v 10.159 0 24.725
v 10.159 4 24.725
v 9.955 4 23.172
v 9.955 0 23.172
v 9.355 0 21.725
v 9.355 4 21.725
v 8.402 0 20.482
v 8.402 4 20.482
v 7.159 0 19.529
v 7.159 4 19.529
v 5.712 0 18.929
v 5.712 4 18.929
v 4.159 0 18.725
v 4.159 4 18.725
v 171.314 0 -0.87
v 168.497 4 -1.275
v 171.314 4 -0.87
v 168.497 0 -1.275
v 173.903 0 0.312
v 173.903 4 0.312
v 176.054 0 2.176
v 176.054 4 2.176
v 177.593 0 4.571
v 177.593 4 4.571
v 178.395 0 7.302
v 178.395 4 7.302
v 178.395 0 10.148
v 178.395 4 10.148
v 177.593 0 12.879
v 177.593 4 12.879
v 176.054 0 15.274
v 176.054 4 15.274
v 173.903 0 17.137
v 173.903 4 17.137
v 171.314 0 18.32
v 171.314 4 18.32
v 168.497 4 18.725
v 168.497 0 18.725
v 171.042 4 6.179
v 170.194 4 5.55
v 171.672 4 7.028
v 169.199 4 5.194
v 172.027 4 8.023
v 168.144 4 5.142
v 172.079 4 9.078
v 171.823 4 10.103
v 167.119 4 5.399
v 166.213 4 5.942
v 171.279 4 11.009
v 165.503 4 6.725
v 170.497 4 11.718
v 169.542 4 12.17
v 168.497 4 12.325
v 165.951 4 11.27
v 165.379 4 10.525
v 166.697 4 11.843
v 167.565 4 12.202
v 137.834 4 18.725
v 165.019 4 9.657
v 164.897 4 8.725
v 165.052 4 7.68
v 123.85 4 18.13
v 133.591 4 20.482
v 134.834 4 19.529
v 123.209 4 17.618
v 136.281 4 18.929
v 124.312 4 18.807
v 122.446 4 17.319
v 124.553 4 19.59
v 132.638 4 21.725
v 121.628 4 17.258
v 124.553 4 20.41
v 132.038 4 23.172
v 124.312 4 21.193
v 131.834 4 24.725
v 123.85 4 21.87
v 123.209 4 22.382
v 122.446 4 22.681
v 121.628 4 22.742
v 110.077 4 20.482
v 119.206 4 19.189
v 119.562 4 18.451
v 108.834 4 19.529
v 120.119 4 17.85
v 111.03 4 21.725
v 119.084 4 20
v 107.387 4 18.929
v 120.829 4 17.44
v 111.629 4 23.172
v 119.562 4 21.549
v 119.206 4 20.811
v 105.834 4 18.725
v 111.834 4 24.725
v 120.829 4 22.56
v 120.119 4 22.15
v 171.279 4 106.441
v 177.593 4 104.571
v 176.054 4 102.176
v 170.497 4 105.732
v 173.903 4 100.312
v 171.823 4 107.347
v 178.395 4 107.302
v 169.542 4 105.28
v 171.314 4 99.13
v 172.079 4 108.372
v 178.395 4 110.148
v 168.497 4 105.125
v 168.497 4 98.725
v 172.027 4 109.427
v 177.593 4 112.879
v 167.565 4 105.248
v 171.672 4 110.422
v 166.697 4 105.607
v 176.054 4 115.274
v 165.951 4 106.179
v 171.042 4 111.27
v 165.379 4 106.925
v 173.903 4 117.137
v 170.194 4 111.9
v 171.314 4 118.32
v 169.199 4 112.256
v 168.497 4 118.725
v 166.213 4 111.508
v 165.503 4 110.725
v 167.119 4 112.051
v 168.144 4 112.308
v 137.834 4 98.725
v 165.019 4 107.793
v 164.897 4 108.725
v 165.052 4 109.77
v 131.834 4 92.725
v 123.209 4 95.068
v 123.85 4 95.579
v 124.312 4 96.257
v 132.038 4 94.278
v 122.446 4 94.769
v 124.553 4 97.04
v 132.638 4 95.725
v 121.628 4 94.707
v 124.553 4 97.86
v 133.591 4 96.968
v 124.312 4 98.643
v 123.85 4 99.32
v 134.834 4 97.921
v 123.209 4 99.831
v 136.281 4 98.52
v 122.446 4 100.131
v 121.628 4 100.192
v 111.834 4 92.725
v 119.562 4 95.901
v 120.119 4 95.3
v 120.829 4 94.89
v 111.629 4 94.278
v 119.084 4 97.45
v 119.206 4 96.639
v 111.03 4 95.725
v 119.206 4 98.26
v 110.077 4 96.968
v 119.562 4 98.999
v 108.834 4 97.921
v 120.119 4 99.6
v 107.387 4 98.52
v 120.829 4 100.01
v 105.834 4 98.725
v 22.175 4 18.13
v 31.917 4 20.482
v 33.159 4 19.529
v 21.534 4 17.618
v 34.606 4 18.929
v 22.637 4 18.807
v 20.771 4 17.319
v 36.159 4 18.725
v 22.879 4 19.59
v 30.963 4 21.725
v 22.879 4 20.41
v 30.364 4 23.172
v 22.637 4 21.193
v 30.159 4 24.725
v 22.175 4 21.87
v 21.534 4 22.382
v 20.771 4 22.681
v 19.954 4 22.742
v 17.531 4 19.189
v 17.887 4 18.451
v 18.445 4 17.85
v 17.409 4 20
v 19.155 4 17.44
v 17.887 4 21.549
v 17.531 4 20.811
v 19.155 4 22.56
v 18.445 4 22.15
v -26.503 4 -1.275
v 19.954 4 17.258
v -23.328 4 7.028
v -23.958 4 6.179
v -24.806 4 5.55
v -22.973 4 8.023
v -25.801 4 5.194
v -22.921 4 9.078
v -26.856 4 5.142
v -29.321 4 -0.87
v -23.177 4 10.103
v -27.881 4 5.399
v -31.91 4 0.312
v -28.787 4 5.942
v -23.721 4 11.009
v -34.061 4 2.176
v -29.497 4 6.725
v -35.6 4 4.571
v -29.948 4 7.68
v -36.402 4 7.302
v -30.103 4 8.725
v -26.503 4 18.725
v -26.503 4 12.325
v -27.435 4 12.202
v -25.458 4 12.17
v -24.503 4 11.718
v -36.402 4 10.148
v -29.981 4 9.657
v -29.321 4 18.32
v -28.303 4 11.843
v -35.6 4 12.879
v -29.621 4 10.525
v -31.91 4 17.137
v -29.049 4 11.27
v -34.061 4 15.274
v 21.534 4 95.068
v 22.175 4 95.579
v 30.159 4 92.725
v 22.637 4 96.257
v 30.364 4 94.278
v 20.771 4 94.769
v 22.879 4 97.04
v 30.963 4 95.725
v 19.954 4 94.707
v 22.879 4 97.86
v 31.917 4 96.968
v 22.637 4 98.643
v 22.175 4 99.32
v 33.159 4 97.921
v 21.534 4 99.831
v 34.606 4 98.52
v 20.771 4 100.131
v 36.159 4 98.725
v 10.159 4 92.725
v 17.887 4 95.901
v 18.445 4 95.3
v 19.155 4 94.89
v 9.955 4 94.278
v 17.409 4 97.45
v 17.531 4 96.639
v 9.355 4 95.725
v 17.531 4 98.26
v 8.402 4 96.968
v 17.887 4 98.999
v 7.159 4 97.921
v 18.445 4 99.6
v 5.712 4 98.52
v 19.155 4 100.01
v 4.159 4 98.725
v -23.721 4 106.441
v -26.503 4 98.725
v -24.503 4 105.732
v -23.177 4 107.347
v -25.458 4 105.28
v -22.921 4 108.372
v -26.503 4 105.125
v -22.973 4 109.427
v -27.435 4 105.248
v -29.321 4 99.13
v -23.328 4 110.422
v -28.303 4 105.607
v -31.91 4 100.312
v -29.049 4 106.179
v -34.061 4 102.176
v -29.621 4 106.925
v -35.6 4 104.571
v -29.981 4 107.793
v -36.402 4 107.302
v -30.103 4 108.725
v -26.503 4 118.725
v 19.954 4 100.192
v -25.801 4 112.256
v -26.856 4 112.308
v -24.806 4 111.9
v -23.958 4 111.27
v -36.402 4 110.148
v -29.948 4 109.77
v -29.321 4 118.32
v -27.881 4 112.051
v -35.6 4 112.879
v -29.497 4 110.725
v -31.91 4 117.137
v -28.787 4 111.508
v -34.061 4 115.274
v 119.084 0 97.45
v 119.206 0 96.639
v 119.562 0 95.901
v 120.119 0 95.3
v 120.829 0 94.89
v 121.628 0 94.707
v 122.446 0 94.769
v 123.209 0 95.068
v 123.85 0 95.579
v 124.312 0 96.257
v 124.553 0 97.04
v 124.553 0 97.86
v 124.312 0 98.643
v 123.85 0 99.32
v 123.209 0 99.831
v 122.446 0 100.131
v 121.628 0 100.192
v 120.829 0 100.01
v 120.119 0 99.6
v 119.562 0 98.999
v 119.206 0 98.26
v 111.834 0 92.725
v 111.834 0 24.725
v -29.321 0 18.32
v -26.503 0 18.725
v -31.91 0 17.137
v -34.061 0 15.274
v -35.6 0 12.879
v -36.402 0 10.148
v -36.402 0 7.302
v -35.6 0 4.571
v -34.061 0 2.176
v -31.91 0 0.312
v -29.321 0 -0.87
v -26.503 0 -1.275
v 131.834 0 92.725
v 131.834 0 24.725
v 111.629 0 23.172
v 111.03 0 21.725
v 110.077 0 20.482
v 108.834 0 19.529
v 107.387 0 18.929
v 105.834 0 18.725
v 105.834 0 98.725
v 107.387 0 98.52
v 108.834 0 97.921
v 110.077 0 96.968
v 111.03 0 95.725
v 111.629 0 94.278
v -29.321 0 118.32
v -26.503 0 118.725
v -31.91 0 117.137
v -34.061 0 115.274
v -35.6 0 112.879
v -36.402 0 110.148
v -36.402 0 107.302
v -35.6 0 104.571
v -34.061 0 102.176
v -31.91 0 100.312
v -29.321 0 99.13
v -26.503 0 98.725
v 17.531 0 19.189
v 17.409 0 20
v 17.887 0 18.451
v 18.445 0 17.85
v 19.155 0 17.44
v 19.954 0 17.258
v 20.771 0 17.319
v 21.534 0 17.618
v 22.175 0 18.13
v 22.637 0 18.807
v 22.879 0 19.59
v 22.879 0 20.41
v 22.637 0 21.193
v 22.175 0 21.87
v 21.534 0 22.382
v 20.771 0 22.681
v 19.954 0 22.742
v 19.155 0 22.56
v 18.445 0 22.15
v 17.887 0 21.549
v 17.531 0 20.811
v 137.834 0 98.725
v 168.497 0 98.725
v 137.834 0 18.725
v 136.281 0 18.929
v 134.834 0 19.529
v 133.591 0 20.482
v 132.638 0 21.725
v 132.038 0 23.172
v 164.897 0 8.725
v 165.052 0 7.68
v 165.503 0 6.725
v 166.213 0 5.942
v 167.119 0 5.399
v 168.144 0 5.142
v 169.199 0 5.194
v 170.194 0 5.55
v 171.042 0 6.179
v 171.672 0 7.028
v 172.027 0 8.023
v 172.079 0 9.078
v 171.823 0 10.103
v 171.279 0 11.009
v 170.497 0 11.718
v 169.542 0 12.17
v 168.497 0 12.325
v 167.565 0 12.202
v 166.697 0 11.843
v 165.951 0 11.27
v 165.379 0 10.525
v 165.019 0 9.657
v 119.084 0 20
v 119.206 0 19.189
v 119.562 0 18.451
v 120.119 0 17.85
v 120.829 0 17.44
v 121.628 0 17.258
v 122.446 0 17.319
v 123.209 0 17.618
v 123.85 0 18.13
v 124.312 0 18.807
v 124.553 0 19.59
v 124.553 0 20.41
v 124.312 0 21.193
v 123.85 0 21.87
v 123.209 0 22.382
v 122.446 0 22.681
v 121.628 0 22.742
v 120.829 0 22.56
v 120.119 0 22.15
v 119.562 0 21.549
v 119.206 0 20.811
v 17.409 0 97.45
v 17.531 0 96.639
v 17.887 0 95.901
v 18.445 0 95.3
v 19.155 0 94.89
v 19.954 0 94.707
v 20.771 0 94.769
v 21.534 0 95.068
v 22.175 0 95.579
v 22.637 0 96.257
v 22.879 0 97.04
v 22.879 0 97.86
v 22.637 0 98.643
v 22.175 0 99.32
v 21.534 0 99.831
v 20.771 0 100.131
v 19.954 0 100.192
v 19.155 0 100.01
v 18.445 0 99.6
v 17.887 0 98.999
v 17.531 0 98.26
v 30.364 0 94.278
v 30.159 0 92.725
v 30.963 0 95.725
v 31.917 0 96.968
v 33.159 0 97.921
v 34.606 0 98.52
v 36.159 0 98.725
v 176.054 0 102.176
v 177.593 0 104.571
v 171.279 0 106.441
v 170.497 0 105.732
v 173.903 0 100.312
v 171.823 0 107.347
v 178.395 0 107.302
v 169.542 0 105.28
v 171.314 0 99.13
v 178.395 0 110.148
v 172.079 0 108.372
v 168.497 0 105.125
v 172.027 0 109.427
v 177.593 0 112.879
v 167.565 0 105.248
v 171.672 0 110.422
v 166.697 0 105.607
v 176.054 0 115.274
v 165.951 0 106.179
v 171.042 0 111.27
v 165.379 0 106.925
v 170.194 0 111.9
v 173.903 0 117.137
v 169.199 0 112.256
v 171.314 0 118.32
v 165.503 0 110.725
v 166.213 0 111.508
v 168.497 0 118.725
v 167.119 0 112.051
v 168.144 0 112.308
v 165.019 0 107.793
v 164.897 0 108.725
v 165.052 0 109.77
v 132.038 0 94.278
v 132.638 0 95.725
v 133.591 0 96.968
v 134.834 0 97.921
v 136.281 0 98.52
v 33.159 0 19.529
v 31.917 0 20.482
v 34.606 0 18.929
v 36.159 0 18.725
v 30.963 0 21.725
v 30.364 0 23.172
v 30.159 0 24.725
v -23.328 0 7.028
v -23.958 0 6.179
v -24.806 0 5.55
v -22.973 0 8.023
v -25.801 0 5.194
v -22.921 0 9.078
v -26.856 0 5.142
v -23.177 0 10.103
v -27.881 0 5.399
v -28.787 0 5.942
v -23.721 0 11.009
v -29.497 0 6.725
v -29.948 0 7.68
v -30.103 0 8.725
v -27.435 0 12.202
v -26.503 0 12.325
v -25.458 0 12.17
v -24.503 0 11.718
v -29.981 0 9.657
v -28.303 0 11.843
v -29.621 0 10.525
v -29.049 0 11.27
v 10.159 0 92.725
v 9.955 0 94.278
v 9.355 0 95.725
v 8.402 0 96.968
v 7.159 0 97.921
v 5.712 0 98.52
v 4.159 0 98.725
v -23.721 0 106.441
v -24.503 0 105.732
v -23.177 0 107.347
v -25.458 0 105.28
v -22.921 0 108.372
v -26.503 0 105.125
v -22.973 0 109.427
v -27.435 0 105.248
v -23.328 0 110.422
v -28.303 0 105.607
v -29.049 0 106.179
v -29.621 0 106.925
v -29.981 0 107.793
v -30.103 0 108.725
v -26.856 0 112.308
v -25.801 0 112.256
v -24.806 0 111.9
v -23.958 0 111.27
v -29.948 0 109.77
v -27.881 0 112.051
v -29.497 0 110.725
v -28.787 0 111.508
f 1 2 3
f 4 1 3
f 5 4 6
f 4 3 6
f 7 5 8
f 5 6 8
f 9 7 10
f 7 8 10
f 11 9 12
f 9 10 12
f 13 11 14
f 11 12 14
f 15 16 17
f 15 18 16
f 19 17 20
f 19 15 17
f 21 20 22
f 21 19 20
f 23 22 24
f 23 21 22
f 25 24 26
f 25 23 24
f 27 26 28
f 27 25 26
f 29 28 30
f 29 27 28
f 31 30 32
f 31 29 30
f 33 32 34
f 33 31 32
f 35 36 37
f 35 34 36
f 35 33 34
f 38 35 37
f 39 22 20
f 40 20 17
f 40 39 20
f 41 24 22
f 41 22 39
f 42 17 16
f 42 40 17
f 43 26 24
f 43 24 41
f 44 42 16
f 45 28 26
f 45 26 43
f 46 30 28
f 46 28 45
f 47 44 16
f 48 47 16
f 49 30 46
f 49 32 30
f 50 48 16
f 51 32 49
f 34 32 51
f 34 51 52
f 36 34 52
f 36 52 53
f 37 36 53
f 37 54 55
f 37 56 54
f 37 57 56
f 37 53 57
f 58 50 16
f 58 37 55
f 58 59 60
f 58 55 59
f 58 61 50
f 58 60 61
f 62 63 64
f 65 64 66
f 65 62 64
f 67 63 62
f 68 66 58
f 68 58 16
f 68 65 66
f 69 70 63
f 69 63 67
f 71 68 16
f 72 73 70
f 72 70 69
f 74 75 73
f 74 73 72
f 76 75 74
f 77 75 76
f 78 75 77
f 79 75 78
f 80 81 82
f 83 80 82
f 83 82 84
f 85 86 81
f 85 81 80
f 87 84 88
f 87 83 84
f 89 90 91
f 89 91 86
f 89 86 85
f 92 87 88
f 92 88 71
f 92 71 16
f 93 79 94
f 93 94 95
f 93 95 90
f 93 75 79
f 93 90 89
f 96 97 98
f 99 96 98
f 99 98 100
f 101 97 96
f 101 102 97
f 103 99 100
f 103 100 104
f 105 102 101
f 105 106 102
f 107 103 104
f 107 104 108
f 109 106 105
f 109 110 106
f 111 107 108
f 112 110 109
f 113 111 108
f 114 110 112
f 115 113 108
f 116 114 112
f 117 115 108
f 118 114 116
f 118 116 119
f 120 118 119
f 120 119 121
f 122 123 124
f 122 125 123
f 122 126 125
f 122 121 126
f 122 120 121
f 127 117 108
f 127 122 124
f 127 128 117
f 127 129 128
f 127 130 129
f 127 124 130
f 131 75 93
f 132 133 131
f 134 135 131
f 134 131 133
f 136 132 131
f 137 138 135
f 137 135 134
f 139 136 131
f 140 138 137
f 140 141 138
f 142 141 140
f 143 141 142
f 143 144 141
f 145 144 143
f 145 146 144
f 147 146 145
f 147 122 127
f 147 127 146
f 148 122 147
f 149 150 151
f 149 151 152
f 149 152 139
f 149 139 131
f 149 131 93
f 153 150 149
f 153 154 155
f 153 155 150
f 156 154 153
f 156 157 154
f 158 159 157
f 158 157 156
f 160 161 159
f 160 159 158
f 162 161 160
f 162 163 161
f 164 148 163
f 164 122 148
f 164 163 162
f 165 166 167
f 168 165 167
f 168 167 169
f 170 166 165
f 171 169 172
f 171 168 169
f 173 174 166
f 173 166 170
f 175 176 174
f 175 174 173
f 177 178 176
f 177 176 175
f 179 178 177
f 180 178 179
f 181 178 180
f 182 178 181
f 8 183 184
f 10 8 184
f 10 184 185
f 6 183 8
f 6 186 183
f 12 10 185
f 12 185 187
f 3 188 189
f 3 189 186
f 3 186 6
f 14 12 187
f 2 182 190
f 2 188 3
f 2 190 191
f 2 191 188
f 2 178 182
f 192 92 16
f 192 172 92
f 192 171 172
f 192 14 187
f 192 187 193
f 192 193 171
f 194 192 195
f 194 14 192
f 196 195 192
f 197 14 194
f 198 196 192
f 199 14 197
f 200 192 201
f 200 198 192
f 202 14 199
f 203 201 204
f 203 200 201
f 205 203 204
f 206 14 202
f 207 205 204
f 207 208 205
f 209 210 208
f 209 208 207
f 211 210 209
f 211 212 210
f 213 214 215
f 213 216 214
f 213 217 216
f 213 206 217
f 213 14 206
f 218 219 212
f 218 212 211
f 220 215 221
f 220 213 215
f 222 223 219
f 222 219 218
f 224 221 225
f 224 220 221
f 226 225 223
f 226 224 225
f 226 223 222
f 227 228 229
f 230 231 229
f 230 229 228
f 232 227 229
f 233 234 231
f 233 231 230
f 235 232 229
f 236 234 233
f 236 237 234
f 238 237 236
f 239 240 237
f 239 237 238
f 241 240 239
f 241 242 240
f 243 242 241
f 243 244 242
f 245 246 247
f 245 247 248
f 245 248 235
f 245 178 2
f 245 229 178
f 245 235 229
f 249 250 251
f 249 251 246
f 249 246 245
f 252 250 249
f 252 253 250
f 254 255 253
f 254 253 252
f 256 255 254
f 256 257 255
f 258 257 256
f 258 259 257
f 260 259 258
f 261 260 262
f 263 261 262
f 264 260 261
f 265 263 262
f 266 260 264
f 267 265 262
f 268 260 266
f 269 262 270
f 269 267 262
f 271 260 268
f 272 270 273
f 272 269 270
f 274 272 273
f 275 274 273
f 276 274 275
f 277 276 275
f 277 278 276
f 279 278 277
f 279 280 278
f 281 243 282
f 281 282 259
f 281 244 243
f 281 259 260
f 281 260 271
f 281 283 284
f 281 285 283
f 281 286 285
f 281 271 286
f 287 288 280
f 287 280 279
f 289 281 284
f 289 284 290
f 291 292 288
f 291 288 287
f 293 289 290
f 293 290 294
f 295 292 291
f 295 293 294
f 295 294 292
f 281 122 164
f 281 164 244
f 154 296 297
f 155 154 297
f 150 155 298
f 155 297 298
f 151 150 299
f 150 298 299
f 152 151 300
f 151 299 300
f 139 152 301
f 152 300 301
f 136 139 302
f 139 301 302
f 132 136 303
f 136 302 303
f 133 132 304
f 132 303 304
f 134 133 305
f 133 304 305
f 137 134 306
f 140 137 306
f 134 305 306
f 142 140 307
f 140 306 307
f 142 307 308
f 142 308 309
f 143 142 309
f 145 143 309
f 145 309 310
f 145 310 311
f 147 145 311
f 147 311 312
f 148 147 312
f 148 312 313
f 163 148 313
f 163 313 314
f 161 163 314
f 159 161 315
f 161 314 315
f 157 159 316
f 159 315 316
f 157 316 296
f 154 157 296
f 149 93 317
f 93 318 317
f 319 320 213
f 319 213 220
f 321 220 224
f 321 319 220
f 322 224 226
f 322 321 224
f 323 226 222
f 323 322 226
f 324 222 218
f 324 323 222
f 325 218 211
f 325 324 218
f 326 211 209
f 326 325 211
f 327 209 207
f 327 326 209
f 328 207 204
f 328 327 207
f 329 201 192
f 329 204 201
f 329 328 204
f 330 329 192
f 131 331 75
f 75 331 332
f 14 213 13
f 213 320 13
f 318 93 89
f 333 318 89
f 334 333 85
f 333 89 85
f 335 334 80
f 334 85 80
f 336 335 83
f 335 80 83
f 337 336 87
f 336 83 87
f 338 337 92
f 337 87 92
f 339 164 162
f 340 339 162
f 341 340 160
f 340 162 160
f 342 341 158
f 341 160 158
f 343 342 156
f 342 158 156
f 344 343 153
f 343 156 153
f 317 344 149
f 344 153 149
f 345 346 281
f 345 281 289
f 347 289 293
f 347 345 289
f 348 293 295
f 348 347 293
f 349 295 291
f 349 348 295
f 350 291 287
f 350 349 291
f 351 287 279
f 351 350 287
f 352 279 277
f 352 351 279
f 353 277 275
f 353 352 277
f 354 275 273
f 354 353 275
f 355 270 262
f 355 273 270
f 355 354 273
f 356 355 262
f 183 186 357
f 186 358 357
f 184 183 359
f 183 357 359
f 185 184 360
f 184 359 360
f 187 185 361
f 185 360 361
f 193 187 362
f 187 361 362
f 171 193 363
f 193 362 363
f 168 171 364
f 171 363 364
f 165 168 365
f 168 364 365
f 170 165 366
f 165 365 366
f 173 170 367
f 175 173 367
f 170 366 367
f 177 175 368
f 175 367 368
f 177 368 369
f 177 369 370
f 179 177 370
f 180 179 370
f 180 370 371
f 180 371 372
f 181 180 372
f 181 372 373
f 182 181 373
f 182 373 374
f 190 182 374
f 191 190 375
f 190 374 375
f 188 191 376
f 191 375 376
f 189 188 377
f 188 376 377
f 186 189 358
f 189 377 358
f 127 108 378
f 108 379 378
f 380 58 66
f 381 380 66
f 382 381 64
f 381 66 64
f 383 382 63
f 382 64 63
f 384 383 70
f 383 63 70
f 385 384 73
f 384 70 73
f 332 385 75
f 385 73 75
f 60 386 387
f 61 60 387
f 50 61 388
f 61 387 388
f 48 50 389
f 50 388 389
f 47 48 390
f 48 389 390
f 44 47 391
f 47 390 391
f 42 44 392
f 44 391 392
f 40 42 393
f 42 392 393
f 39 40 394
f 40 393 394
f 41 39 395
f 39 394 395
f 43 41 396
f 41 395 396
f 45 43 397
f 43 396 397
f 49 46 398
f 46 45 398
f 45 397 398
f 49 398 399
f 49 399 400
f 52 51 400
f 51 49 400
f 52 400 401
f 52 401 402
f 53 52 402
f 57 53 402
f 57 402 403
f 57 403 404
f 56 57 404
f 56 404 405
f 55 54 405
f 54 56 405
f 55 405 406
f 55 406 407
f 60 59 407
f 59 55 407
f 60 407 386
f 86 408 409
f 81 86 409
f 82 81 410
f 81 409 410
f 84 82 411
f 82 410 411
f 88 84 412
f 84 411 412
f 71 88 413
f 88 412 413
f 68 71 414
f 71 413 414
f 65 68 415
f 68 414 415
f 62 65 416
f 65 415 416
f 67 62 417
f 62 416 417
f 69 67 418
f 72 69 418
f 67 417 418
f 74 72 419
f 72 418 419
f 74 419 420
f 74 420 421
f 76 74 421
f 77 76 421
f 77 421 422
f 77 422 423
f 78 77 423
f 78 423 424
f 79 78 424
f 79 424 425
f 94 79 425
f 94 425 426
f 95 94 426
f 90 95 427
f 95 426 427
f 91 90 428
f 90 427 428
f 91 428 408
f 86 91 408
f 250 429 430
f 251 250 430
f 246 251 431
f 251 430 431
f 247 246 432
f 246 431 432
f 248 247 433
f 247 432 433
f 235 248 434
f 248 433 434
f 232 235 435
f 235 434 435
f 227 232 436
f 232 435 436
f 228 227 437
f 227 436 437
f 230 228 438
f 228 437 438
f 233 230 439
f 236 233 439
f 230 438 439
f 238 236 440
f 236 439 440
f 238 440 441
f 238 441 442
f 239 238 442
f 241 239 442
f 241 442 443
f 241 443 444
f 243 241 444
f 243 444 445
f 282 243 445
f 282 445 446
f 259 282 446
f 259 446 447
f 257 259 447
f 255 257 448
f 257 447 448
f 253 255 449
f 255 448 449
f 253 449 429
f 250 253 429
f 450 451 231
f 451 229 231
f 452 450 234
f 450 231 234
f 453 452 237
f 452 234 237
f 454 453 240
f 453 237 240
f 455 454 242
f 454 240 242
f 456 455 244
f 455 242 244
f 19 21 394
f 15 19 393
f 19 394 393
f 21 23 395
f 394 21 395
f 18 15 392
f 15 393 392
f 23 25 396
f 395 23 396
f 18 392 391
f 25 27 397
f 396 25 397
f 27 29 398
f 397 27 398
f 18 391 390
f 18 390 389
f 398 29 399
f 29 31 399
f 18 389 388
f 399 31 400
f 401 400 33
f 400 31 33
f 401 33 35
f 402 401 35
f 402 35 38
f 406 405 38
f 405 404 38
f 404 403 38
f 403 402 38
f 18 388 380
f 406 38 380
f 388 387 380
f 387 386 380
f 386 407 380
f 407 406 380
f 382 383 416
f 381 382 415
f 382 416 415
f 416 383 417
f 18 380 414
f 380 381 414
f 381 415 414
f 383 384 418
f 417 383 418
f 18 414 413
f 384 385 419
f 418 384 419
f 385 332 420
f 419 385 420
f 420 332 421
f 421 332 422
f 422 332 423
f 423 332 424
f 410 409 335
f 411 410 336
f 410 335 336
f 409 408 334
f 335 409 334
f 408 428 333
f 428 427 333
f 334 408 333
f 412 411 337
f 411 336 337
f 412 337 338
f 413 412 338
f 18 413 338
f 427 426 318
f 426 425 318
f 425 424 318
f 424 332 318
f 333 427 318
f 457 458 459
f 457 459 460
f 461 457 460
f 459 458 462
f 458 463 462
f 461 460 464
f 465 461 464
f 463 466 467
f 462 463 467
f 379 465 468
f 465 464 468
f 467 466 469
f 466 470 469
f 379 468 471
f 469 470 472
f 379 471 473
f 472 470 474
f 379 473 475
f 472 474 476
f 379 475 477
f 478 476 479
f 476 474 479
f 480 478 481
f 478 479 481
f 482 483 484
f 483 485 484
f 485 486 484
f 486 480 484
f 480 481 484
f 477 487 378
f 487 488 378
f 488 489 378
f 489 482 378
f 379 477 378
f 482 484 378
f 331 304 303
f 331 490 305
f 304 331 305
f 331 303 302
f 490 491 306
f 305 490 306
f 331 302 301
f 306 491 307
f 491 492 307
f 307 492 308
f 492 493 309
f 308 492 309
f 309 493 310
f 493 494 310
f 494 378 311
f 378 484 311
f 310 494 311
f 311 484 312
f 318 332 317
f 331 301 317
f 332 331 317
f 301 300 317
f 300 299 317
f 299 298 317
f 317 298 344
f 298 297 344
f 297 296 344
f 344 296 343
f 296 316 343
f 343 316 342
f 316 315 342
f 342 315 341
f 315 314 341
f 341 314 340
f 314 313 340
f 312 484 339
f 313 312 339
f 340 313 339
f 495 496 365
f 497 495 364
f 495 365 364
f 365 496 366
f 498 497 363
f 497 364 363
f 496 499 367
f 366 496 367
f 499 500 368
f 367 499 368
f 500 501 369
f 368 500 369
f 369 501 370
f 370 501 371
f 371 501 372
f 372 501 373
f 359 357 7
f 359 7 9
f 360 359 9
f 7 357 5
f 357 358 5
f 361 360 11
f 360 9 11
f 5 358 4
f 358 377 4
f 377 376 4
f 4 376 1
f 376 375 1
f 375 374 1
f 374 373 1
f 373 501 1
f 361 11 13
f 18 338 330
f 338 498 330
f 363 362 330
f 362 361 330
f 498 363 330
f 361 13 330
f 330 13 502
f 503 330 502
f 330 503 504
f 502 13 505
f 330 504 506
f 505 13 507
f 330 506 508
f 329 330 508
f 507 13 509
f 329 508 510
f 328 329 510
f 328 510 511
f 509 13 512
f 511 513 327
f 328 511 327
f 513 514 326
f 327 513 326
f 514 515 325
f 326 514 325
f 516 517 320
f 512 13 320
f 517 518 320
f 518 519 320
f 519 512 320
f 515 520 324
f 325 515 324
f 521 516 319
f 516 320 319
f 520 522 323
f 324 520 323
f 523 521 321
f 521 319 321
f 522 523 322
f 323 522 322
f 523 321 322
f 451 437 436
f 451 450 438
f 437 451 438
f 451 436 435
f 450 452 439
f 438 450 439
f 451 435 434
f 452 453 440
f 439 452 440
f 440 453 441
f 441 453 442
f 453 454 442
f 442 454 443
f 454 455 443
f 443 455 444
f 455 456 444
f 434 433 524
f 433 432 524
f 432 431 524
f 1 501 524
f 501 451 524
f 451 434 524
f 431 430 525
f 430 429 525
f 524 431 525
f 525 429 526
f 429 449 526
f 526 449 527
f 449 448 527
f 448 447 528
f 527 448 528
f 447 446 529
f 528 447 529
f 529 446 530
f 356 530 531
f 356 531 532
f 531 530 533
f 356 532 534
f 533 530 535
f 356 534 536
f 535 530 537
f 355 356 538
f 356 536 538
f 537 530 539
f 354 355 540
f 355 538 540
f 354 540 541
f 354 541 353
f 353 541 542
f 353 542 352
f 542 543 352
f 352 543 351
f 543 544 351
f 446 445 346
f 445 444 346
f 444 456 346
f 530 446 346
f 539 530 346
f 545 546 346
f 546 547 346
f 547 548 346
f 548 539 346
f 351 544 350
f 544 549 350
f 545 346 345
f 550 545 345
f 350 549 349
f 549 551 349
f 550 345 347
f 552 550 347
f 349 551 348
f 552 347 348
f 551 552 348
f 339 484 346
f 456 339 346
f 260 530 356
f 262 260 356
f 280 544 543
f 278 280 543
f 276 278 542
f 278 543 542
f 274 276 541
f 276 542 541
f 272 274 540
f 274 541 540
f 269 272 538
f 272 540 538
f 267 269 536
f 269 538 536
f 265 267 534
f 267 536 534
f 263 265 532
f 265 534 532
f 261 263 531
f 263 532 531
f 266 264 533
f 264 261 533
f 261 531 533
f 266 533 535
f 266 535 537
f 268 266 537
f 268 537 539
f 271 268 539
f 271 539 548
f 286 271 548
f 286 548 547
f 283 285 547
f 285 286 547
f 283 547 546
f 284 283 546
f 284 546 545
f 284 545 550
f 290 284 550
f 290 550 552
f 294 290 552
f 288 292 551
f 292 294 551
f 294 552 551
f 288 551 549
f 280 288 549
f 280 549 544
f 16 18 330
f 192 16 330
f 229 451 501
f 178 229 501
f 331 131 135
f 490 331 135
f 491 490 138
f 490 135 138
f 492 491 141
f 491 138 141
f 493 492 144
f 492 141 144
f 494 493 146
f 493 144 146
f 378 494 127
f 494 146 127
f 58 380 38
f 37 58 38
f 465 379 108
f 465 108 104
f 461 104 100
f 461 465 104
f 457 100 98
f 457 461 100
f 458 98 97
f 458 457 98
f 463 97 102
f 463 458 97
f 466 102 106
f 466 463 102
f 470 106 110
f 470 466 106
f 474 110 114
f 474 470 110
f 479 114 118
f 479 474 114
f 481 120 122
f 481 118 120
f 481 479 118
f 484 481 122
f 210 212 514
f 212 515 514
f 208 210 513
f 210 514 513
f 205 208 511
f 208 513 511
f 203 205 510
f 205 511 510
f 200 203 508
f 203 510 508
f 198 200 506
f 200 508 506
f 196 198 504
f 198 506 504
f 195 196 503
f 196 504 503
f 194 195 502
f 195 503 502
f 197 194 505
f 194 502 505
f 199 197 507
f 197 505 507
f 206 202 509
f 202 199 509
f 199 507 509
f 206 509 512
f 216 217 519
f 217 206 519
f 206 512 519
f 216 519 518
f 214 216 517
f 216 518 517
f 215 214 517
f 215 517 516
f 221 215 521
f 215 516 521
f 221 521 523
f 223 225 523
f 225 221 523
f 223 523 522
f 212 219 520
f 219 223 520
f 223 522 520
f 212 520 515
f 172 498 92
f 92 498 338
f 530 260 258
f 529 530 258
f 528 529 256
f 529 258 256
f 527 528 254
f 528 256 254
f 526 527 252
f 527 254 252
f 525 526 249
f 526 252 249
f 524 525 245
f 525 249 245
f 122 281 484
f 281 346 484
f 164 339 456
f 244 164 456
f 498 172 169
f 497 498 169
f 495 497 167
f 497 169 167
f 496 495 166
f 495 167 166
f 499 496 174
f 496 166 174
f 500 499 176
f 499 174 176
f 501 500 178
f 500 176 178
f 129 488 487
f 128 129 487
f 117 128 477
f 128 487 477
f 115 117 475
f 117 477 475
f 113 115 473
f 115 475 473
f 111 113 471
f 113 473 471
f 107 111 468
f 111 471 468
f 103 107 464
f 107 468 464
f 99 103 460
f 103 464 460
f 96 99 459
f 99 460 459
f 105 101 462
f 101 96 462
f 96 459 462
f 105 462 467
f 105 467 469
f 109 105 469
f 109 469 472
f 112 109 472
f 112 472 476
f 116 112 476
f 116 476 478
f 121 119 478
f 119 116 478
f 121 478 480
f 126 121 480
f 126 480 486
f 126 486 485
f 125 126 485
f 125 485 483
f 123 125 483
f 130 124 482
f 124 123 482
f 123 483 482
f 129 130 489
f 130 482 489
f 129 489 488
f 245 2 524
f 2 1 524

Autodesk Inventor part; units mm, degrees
ref_plane "YZ Plane" through (0, 0, 0) normal (1, 0, 0) x (0, 1, 0)
ref_plane "XZ Plane" through (0, 0, 0) normal (0, 1, 0) x (-1, 0, 0)
ref_plane "XY Plane" through (0, 0, 0) normal (0, 0, 1) x (1, 0, 0)
sketch "Sketch1" plane through (0, 0, 0) normal (0, 1, 0) x (-1, 0, 0)
  line L0 (-7, 37.9777) -> (-7, 79.4722)
  spline S0 degree 3 poles (-7, 79.4722) (-7, 80.2679) (-6.8804, 81.313) (-5.8043, 84.1015) (-4.8936, 85.3942) (-3.1709, 87.6073) (-2.4028, 88.4658) (-2.0131, 89.2627) (-1.9647, 89.4035) (-1.9309, 89.6007) (-1.9254, 89.6626) (-1.9254, 89.7249) knots 0 0 0 0 0.238712 0.238712 0.524177 0.524177 0.81278 0.81278 0.88277 0.88277 0.915008 0.915008 0.915008 0.915008
  line L1 (0, 89.7249) -> (-1.9254, 89.7249)
  line L2 (0, 111.4478) -> (0, 89.7249)
  arc A0 (-6.2149, 117.4498) -> (0, 111.4478) centre (-2.5273, 115.0495) ccw
  line L3 (-135.9053, 117.4498) -> (-6.2149, 117.4498)
  arc A1 (-141.8339, 111.5213) -> (-135.9053, 117.4498) centre (-139.8146, 115.4305) ccw
  line L4 (-141.8339, 89.7249) -> (-141.8339, 111.5213)
  line L5 (-139.9085, 89.7249) -> (-141.8339, 89.7249)
  spline S1 degree 3 poles (-134.8339, 79.4722) (-134.8339, 80.1182) (-134.9165, 80.7597) (-135.2383, 82.0916) (-135.4922, 82.7684) (-136.3337, 84.5039) (-137.0038, 85.4638) (-138.2583, 87.0963) (-138.8405, 87.7821) (-139.5233, 88.7046) (-139.7055, 88.9932) (-139.8538, 89.363) (-139.888, 89.4816) (-139.9062, 89.645) (-139.9085, 89.685) (-139.9085, 89.7249) knots -1.843204 -1.843204 -1.843204 -1.843204 -1.717345 -1.717345 -1.576636 -1.576636 -1.342905 -1.342905 -1.132569 -1.132569 -0.995579 -0.995579 -0.934295 -0.934295 -0.914246 -0.914246 -0.914246 -0.914246
  line L6 (-134.8339, 79.4722) -> (-134.8339, 37.9777)
  spline S2 degree 3 poles (-134.8339, 37.9777) (-134.8339, 37.182) (-134.9535, 36.1368) (-136.0296, 33.3484) (-136.9403, 32.0557) (-138.663, 29.8425) (-139.4311, 28.984) (-139.8208, 28.1872) (-139.8692, 28.0464) (-139.903, 27.8492) (-139.9085, 27.7873) (-139.9085, 27.7249) knots 0 0 0 0 0.238712 0.238712 0.524177 0.524177 0.81278 0.81278 0.88277 0.88277 0.915008 0.915008 0.915008 0.915008
  line L7 (-141.8339, 27.7249) -> (-139.9085, 27.7249)
  line L8 (-141.8339, 5.9286) -> (-141.8339, 27.7249)
  arc A2 (-135.9053, 0) -> (-141.8339, 5.9286) centre (-139.8146, 2.0193) ccw
  line L9 (-6.0879, 0) -> (-135.9053, 0)
  arc A3 (0, 6.0879) -> (-6.0879, 0) centre (-2.4003, 2.4003) ccw
  line L10 (0, 27.7249) -> (0, 6.0879)
  line L11 (-1.9254, 27.7249) -> (0, 27.7249)
  spline S3 degree 3 poles (-7, 37.9777) (-7, 37.3317) (-6.9174, 36.6902) (-6.5955, 35.3583) (-6.3417, 34.6814) (-5.5001, 32.9459) (-4.8301, 31.986) (-3.5755, 30.3535) (-2.9934, 29.6677) (-2.3106, 28.7453) (-2.1284, 28.4567) (-1.9801, 28.0868) (-1.9459, 27.9682) (-1.9277, 27.8049) (-1.9254, 27.7649) (-1.9254, 27.7249) knots -1.843204 -1.843204 -1.843204 -1.843204 -1.717345 -1.717345 -1.576636 -1.576636 -1.342905 -1.342905 -1.132569 -1.132569 -0.995579 -0.995579 -0.934295 -0.934295 -0.914246 -0.914246 -0.914246 -0.914246
  circle A4 centre (-121.8339, 20) radius 2.75
  line L12 (-121.8339, 24.7343) -> (-117.7339, 22.3671)
  line L13 (-117.7339, 22.3671) -> (-117.7339, 17.6329)
  line L14 (-117.7339, 17.6329) -> (-121.8339, 15.2657)
  line L15 (-121.8339, 15.2657) -> (-125.9339, 17.6329)
  line L16 (-125.9339, 17.6329) -> (-125.9339, 22.3671)
  line L17 (-125.9339, 22.3671) -> (-121.8339, 24.7343)
  line L18 (-134.8339, 39.0386) -> (-134.8339, 78.4112)
  line L19 (-134.8339, 58.7249) -> (-125.9339, 58.7249)
  line L20 (-70.9966, 0) -> (-70.9966, 6.0879)
  line L21 (-117.7339, 95.0827) -> (-117.7339, 99.817)
  line L22 (-117.7339, 99.817) -> (-121.8339, 102.1841)
  line L23 (-125.9339, 95.0827) -> (-121.8339, 92.7156)
  line L24 (-125.9339, 99.817) -> (-125.9339, 95.0827)
  circle A5 centre (-121.8339, 97.4498) radius 2.75
  line L25 (-121.8339, 102.1841) -> (-125.9339, 99.817)
  line L26 (-121.8339, 92.7156) -> (-117.7339, 95.0827)
  line L27 (-24.2593, 22.3671) -> (-24.2593, 17.6329)
  line L28 (-20.1593, 24.7343) -> (-24.2593, 22.3671)
  line L29 (-24.2593, 17.6329) -> (-20.1593, 15.2657)
  circle A6 centre (-20.1593, 20) radius 2.75
  line L30 (-16.0593, 17.6329) -> (-16.0593, 22.3671)
  line L31 (-20.1593, 15.2657) -> (-16.0593, 17.6329)
  line L32 (-16.0593, 22.3671) -> (-20.1593, 24.7343)
  line L33 (-20.1593, 92.7156) -> (-24.2593, 95.0827)
  line L34 (-24.2593, 95.0827) -> (-24.2593, 99.817)
  line L35 (-16.0593, 99.817) -> (-16.0593, 95.0827)
  circle A7 centre (-20.1593, 97.4498) radius 2.75
  line L36 (-24.2593, 99.817) -> (-20.1593, 102.1841)
  line L37 (-20.1593, 102.1841) -> (-16.0593, 99.817)
  line L38 (-16.0593, 95.0827) -> (-20.1593, 92.7156)
  circle A8 centre (-121.8339, 20) radius 7.5
  circle A9 centre (-121.8339, 97.4498) radius 7.5
  circle A10 centre (-20.1593, 20) radius 7.5
  circle A11 centre (-20.1593, 97.4498) radius 7.5
  line L39 (26.5034, 108.7249) -> (-168.4966, 108.7249) construction
  line L40 (26.5034, 118.7249) -> (-168.4966, 118.7249)
  line L41 (-168.4966, 98.7249) -> (26.5034, 98.7249)
  arc A12 (26.5034, 98.7249) -> (26.5034, 118.7249) centre (26.5034, 108.7249) ccw
  arc A13 (-168.4966, 118.7249) -> (-168.4966, 98.7249) centre (-168.4966, 108.7249) ccw
  circle A14 centre (26.5034, 108.7249) radius 3.6
  circle A15 centre (-168.4966, 108.7249) radius 3.6
  line L42 (-121.8339, 97.4498) -> (-20.1593, 97.4498)
  line L43 (-20.1593, 97.4498) -> (-20.1593, 20)
  line L44 (26.5034, 8.7249) -> (26.5034, 108.7249)
  line L45 (-168.4966, 108.7249) -> (-168.4966, 8.7249)
  line L46 (26.5034, 8.7249) -> (-168.4966, 8.7249) construction
  line L47 (26.5034, 18.7249) -> (-168.4966, 18.7249)
  line L48 (-168.4966, -1.2751) -> (26.5034, -1.2751)
  arc A16 (26.5034, -1.2751) -> (26.5034, 18.7249) centre (26.5034, 8.7249) ccw
  arc A17 (-168.4966, 18.7249) -> (-168.4966, -1.2751) centre (-168.4966, 8.7249) ccw
  circle A18 centre (26.5034, 8.7249) radius 3.6
  circle A19 centre (-168.4966, 8.7249) radius 3.6
  line L49 (-20.1593, 20) -> (-20.1593, 97.4498) construction
  line L50 (-10.1593, 18.7249) -> (-10.1593, 98.7249)
  line L51 (-30.1593, 98.7249) -> (-30.1593, 18.7249)
  line L52 (-121.8339, 20) -> (-121.8339, 97.4498) construction
  line L53 (-111.8339, 18.7249) -> (-111.8339, 98.7249)
  line L54 (-131.8339, 98.7249) -> (-131.8339, 18.7249)
  point P0 (0, 0)
  point P1 (0, 0)
  point P2 (-16.0593, 58.7249)
  point P3 (-70.9966, 108.7249)
  point P4 (-70.9966, 97.4498)
  point P5 (26.5034, 58.7249)
  point P6 (-20.1593, 58.7249)
  point P7 (-70.9966, 8.7249)
  point P8 (-20.1593, 58.7249)
  point P9 (-121.8339, 58.7249)
  dimension "d0" = 5.5
  dimension "d1" = 8.2
  dimension "d2" = 20
  dimension "d3" = 20
  dimension "d4" = 15
  dimension "d5" = 195
  dimension "d6" = 20
  dimension "d7" = 7.2
  dimension "d8" = 7.2
  dimension "d9" = 100
  dimension "d10" = 20
  dimension "d11" = 7.2
  dimension "d12" = 7.2
extrude "Extrusion1" add sketch "Sketch1" along normal blind 4 contours L47 A16 L48 A17 L8 A2 L9 A3 L10 | L10 A3 L9 A2 L8 L47 A8 A10 | L41 A11 A9 L4 A1 L3 A0 L2 | L2 A0 L3 A1 L4 L41 A13 L40 A12 | L47 A10 L43 A11 L41 L50 | L47 L30 L32 L43 A10 | A10 L47 L27 L29 L31 L30 | L41 L35 L37 L36 L34 A11 | A11 L43 L38 L35 L41 | L47 L51 L42 A11 L43 A10 | A10 L43 L28 L27 L47 | L47 A6 L43 L32 L30 | L30 L31 L29 L27 L47 A6 | L41 L34 L42 A11 | A11 L42 L51 L41 | L41 A7 L34 L36 L37 L35 | L35 L38 L43 A7 L41 | L27 L28 L43 A6 L47 | A11 L42 L34 L33 L43 | L41 A7 L42 L34 | L47 A8 L54 L41 A9 L42 L53 | L33 L34 L42 A7 L43 | L53 L42 A9 L41 | L47 L13 L12 L17 L16 A8 | A8 L47 L16 L15 L14 L13 | L41 L21 L22 L25 L24 A9 | A9 L42 L21 L41 | L47 A4 L16 L17 L12 L13 | L13 L14 L15 L16 L47 A4 | A9 L41 L24 L23 L26 L21 L42 | L41 A5 L24 L25 L22 L21 | L21 L42 A5 L41 | L21 L26 L23 L24 L41 A5 L42
fillet "Fillet1" radius 6 8 edges at (30.1593, 2, 98.7249) (10.1593, 2, 98.7249) (10.1593, 2, 18.7249) (30.1593, 2, 18.7249) (111.8339, 2, 18.7249) (131.8339, 2, 18.7249) (111.8339, 2, 98.7249) (131.8339, 2, 98.7249)
properties part number "Mount Base"
